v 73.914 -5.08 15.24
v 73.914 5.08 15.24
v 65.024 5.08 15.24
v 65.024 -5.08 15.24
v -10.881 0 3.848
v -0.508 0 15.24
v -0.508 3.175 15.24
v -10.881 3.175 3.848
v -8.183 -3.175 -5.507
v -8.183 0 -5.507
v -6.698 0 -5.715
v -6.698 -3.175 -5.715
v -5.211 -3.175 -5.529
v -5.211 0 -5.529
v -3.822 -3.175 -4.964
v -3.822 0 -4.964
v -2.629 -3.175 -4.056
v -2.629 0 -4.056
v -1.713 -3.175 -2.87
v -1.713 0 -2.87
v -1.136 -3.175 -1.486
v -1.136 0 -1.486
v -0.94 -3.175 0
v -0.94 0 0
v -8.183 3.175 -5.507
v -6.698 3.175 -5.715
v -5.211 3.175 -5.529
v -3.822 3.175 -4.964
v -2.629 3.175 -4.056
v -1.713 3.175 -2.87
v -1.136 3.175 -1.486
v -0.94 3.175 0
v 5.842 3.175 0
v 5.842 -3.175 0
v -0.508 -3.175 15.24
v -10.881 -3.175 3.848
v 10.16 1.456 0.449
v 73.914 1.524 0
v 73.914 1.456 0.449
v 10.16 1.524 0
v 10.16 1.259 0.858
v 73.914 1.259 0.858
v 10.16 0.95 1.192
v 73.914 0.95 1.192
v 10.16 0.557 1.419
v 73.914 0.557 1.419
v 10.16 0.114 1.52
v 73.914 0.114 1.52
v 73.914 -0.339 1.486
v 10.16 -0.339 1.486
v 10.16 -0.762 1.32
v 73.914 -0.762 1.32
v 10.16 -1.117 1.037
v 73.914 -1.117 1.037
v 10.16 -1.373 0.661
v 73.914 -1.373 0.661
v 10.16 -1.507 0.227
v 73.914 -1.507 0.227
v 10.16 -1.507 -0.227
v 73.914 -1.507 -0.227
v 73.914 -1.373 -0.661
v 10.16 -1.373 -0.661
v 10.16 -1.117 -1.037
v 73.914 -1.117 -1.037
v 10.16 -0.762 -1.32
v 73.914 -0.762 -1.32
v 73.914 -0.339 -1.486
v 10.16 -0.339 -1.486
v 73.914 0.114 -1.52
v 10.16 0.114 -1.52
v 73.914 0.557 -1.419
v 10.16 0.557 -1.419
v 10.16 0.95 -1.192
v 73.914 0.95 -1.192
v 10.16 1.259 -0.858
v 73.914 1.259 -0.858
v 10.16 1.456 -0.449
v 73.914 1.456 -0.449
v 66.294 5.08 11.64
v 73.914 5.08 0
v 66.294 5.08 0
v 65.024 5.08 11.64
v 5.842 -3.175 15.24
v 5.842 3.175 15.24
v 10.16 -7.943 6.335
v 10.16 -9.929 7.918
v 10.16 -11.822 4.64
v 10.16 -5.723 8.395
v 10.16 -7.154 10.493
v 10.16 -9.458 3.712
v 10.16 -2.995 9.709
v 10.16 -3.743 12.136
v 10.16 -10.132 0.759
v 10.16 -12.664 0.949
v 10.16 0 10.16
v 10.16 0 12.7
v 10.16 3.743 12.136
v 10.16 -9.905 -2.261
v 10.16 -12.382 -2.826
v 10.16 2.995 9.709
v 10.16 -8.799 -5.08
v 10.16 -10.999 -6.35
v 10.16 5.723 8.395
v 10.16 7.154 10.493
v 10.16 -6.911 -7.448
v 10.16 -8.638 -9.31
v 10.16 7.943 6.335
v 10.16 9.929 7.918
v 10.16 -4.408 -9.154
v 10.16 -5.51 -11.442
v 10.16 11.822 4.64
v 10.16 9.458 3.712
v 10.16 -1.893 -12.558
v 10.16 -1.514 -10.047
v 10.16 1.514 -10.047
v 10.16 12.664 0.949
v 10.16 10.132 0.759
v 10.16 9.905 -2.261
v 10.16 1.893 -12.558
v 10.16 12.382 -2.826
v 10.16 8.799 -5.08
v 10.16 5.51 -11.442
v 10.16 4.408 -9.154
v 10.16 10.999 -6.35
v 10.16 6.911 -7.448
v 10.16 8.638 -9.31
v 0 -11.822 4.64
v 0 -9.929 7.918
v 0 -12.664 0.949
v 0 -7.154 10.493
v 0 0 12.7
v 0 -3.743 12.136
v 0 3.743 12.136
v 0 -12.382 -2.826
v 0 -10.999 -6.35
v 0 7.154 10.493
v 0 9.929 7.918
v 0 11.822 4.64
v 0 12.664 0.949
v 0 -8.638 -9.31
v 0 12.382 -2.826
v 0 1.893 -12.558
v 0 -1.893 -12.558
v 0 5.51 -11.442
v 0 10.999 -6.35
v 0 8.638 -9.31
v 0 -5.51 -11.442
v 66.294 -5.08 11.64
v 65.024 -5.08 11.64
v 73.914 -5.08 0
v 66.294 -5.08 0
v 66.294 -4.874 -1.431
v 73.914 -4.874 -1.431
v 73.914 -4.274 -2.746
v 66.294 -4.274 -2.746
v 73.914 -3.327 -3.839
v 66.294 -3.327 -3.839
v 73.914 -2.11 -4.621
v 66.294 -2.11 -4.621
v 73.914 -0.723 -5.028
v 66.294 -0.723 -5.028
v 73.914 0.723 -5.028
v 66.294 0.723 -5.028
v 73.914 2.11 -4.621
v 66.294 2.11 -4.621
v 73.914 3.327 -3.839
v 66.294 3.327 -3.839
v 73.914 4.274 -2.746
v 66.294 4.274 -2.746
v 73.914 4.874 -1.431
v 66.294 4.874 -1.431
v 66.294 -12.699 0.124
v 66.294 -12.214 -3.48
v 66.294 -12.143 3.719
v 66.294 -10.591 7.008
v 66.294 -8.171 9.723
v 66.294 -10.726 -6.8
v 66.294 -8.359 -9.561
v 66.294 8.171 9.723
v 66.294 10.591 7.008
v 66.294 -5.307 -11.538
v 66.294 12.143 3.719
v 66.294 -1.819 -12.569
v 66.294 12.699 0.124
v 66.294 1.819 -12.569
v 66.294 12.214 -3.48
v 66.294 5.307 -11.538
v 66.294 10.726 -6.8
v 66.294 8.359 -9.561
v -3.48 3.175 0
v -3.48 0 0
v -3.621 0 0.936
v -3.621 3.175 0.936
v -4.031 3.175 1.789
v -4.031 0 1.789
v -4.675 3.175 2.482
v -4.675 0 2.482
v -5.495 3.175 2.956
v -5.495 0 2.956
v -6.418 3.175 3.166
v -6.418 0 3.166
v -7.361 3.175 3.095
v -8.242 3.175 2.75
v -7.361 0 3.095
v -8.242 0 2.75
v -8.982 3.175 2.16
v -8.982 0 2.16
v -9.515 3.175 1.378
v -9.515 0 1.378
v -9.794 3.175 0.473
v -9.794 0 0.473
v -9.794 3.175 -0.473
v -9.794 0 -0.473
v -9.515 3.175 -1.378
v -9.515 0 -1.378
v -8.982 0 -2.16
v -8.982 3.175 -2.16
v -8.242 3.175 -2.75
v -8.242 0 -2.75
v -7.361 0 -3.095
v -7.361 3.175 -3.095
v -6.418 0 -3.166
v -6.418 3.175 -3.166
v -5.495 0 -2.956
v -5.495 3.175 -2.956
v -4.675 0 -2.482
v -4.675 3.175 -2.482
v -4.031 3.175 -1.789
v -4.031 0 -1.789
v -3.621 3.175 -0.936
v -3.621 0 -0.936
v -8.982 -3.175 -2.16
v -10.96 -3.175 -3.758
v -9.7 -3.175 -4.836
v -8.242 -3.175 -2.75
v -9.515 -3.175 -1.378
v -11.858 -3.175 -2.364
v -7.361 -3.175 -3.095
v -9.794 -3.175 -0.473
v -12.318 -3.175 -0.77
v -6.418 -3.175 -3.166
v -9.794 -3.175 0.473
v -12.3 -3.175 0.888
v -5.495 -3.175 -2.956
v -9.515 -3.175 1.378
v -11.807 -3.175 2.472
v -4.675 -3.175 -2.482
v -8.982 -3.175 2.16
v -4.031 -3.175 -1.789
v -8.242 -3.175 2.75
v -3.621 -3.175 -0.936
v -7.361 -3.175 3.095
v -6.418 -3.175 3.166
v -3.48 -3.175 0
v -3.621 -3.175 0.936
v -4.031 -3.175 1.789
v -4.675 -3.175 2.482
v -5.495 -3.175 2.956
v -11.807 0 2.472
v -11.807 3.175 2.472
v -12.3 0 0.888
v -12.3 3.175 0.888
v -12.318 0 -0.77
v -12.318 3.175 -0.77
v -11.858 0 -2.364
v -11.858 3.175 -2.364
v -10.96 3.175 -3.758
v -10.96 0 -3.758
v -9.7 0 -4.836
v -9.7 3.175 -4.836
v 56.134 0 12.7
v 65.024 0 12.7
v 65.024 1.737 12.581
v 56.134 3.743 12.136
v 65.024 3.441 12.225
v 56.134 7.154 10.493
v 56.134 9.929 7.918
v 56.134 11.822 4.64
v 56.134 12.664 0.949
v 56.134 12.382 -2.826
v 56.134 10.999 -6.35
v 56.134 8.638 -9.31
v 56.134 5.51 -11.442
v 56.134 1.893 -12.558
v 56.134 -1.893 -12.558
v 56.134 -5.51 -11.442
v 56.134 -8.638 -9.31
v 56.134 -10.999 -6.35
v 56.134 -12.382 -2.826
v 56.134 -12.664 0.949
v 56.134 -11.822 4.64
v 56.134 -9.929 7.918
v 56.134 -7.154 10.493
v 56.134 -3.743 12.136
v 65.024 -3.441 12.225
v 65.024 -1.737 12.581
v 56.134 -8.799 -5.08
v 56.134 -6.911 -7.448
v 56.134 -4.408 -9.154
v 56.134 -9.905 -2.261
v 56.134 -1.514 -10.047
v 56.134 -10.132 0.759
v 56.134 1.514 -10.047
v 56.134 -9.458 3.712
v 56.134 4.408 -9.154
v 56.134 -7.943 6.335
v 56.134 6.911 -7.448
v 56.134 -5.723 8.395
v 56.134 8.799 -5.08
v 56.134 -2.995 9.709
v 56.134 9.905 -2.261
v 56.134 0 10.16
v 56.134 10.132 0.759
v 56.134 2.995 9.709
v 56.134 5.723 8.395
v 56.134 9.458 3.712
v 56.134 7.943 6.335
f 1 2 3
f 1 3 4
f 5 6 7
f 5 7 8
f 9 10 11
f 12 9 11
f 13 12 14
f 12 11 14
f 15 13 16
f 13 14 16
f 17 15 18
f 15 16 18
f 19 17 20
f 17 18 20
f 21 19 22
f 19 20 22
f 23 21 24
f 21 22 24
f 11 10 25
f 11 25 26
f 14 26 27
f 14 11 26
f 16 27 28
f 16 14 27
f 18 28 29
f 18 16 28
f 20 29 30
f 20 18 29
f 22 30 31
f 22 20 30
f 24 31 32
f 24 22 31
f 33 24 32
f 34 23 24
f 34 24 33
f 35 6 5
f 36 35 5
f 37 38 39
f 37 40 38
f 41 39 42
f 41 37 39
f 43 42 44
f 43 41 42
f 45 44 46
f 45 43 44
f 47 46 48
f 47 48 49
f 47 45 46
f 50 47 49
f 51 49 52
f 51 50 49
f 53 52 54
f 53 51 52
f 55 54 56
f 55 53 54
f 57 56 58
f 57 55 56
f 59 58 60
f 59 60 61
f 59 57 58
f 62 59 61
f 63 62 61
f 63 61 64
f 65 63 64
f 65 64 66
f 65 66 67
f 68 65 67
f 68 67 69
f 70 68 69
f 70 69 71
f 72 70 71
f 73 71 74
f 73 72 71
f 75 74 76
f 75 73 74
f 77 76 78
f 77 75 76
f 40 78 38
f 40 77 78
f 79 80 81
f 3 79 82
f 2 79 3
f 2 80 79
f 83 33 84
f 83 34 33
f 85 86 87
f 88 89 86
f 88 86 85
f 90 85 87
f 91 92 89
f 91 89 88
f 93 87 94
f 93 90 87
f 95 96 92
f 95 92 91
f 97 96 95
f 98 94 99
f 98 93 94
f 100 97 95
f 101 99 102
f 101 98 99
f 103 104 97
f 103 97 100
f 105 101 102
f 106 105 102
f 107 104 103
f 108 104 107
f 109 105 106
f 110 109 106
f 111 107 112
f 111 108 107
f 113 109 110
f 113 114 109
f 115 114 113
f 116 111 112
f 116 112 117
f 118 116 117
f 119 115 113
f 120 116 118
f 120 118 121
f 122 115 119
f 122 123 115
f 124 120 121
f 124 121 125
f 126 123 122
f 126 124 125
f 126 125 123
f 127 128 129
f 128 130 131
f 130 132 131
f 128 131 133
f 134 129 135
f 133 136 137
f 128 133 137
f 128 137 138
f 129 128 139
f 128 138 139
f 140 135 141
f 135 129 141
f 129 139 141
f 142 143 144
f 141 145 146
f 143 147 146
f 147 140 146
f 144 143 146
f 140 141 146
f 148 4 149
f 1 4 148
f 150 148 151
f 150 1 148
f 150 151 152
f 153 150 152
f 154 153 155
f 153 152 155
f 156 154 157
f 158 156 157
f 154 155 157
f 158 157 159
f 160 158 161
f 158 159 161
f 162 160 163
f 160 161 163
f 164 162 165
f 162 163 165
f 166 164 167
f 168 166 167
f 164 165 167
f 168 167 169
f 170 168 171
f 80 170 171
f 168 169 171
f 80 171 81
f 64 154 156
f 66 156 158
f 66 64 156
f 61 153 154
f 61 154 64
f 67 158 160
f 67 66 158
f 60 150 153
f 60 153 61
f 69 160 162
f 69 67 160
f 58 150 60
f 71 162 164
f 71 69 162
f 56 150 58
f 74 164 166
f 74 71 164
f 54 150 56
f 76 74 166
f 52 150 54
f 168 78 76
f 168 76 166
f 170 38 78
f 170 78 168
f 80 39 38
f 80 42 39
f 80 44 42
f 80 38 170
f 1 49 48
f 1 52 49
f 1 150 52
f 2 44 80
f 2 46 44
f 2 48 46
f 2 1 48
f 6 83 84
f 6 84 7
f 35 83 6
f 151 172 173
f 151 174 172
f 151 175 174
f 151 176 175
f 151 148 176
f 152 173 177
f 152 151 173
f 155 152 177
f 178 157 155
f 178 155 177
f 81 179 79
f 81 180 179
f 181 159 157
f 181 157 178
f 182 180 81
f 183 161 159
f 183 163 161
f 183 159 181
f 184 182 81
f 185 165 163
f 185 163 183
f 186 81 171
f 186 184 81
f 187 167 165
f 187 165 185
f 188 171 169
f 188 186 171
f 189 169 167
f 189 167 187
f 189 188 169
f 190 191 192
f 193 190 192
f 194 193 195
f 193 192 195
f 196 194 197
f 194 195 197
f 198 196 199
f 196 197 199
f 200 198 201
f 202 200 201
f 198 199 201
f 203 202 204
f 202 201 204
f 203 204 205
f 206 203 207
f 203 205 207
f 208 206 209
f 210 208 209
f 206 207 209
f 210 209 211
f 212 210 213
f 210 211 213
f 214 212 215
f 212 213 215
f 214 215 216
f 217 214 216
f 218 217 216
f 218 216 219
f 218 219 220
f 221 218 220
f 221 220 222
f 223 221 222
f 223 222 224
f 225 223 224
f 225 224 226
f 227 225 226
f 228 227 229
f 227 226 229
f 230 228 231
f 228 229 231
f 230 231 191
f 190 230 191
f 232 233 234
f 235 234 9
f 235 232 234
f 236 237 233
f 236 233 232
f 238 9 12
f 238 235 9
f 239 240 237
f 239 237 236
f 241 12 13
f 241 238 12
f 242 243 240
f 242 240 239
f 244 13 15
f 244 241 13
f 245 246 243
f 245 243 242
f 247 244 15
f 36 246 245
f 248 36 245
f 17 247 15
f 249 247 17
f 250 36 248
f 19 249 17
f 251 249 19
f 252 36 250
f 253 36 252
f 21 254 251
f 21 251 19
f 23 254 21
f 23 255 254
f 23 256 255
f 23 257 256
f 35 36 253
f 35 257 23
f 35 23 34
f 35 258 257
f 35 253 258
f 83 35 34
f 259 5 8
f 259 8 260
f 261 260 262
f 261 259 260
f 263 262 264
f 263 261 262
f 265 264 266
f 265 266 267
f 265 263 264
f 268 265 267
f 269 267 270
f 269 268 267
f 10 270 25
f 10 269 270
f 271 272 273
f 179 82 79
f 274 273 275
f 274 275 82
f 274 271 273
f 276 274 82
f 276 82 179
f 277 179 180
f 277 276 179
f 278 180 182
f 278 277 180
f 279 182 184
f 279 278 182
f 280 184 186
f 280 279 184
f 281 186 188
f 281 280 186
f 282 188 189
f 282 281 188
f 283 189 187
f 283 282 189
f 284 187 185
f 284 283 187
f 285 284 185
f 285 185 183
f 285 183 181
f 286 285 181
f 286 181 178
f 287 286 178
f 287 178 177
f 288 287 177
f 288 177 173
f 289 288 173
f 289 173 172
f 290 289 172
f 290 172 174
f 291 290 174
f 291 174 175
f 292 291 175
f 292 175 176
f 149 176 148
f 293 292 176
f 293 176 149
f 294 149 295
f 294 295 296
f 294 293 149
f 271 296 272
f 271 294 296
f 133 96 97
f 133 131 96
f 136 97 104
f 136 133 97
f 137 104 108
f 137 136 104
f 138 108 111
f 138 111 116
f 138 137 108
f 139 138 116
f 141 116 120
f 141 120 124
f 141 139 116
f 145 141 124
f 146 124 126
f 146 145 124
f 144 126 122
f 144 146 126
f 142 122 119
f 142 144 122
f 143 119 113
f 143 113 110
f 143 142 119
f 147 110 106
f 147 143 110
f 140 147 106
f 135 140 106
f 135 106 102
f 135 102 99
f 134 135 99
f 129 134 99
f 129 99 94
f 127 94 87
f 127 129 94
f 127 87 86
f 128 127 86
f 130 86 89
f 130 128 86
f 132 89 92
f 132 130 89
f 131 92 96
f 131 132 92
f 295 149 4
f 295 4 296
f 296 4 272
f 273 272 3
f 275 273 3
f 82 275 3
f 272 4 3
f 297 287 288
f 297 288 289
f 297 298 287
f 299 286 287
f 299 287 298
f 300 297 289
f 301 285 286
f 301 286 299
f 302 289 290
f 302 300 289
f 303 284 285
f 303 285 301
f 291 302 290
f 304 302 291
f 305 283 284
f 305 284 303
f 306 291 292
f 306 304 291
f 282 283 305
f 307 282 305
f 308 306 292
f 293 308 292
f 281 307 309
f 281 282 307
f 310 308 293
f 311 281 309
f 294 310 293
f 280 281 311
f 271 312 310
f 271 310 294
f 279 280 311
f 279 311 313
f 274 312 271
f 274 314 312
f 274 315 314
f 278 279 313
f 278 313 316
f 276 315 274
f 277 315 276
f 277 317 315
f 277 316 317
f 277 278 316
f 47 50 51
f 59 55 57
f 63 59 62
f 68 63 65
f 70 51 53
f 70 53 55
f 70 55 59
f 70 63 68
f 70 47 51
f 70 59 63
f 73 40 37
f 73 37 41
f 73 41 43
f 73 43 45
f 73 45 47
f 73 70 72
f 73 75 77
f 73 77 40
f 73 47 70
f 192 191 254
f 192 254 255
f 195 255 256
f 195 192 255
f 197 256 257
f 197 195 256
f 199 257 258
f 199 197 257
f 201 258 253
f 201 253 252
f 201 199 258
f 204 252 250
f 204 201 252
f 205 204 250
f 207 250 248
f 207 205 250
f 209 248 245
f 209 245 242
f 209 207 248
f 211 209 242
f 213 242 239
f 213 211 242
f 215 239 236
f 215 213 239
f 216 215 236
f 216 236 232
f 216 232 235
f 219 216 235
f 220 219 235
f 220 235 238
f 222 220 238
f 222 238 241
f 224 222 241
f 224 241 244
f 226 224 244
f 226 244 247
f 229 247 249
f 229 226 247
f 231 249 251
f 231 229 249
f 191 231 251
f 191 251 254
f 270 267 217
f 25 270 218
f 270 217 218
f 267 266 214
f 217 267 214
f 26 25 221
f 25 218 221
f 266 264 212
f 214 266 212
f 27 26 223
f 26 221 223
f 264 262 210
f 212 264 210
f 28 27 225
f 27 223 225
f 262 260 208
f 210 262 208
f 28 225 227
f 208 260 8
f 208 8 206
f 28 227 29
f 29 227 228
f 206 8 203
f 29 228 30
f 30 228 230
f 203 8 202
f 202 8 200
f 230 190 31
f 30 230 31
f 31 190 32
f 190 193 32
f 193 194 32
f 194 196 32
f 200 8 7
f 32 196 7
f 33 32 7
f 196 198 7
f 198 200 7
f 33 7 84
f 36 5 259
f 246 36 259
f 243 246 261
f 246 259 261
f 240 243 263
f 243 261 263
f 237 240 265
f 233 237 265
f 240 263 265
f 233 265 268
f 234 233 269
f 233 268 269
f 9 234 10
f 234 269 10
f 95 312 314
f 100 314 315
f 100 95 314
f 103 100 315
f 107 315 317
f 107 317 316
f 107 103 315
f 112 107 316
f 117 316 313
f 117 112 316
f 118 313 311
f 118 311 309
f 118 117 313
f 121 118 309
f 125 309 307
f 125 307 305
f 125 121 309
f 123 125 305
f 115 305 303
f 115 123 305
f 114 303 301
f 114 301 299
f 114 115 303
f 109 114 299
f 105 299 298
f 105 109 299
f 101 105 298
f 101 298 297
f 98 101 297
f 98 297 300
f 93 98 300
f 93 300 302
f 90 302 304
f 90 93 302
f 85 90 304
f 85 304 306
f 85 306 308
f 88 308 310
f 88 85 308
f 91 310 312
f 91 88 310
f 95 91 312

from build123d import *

# Parameters (mm, degrees)
F0_W          = 5.842
F0_H          = 12.7
F0_R          = 3.175
F2_DEPTH      = 3.175
F3_R          = 1.524
F4_DEPTH      = 7.62
F4_DEPTH_BACK = 1.27
F5_DEPTH      = 56.134


with BuildPart() as f1:
    # F0 (on Front) → F1 (revolve)
    with BuildSketch(Plane.XZ):
        Polygon((5.842, 12.7), (5.842, 0), (66.294, 0), (66.294, 12.7), (56.134, 12.7), (56.134, 10.16), (10.16, 10.16), (10.16, 12.7), align=None)
        with Locations((2.921, 6.35)):
            Rectangle(F0_W, F0_H)
    revolve(axis=Axis((33.147, 0, 0), (-1, 0, 0)))

    # F3 (on face) → F4 (join, two sides)
    with BuildSketch(Plane.YZ.offset(66.294)) as f4_sk:
        with BuildLine():
            ThreePointArc((-5.08, 0), (0, 5.08), (5.08, 0))
            Line((5.08, 0), (5.08, 11.6397422652))
            ThreePointArc((5.08, 11.6397422652), (0, 12.7), (-5.08, 11.6397422652))
            Line((-5.08, 11.6397422652), (-5.08, 0))
        make_face()
        with BuildLine():
            ThreePointArc((-5.08, 11.6397422652), (0, 12.7), (5.08, 11.6397422652))
            Line((5.08, 11.6397422652), (5.08, 15.24))
            Line((5.08, 15.24), (-5.08, 15.24))
            Line((-5.08, 15.24), (-5.08, 11.6397422652))
        make_face()
        with BuildLine():
            ThreePointArc((-5.08, 0), (0, -5.08), (5.08, 0))
            ThreePointArc((5.08, 0), (0, 5.08), (-5.08, 0))
        make_face()
        Circle(F3_R, mode=Mode.SUBTRACT)
    extrude(amount=F4_DEPTH)
    extrude(f4_sk.sketch, amount=-F4_DEPTH_BACK)

    # F5 (cut, through all): a face of the model
    f5_faces = [f1.faces().sort_by_distance(p)[0] for p in [
        (66.294, 0, 0),
    ]]
    extrude(f5_faces, amount=-F5_DEPTH, mode=Mode.SUBTRACT)


with BuildPart() as f2:
    # F0 (on Front) → F2 (new body, symmetric)
    with BuildSketch(Plane.XZ):
        with Locations((2.921, 6.35)):
            Rectangle(F0_W, F0_H)
        with BuildLine():
            ThreePointArc((-8.1826630726, -5.5069827884), (-3.1957909266, -4.5493385486), (-0.9398, 0))
            ThreePointArc((-0.9398, 0), (-4.5919612295, 5.3297205562), (-10.8806298187, 3.8475430269))
            ThreePointArc((-10.8806298187, 3.8475430269), (-12.1459778134, -1.5837270034), (-8.1826630726, -5.5069827884))
        make_face()
        with Locations((-6.6548, 0)):
            Circle(F0_R, mode=Mode.SUBTRACT)
        with BuildLine():
            Line((-0.9398, 0), (0, 0))
            Line((0, 0), (0, 12.7))
            Line((0, 12.7), (5.842, 12.7))
            Line((5.842, 12.7), (5.842, 15.24))
            Line((5.842, 15.24), (-0.508, 15.24))
            Line((-0.508, 15.24), (-10.8806298187, 3.8475430269))
            ThreePointArc((-10.8806298187, 3.8475430269), (-4.5919612295, 5.3297205562), (-0.9398, 0))
        make_face()
    extrude(amount=F2_DEPTH, both=True)


solid = Compound([f1.part, f2.part])
